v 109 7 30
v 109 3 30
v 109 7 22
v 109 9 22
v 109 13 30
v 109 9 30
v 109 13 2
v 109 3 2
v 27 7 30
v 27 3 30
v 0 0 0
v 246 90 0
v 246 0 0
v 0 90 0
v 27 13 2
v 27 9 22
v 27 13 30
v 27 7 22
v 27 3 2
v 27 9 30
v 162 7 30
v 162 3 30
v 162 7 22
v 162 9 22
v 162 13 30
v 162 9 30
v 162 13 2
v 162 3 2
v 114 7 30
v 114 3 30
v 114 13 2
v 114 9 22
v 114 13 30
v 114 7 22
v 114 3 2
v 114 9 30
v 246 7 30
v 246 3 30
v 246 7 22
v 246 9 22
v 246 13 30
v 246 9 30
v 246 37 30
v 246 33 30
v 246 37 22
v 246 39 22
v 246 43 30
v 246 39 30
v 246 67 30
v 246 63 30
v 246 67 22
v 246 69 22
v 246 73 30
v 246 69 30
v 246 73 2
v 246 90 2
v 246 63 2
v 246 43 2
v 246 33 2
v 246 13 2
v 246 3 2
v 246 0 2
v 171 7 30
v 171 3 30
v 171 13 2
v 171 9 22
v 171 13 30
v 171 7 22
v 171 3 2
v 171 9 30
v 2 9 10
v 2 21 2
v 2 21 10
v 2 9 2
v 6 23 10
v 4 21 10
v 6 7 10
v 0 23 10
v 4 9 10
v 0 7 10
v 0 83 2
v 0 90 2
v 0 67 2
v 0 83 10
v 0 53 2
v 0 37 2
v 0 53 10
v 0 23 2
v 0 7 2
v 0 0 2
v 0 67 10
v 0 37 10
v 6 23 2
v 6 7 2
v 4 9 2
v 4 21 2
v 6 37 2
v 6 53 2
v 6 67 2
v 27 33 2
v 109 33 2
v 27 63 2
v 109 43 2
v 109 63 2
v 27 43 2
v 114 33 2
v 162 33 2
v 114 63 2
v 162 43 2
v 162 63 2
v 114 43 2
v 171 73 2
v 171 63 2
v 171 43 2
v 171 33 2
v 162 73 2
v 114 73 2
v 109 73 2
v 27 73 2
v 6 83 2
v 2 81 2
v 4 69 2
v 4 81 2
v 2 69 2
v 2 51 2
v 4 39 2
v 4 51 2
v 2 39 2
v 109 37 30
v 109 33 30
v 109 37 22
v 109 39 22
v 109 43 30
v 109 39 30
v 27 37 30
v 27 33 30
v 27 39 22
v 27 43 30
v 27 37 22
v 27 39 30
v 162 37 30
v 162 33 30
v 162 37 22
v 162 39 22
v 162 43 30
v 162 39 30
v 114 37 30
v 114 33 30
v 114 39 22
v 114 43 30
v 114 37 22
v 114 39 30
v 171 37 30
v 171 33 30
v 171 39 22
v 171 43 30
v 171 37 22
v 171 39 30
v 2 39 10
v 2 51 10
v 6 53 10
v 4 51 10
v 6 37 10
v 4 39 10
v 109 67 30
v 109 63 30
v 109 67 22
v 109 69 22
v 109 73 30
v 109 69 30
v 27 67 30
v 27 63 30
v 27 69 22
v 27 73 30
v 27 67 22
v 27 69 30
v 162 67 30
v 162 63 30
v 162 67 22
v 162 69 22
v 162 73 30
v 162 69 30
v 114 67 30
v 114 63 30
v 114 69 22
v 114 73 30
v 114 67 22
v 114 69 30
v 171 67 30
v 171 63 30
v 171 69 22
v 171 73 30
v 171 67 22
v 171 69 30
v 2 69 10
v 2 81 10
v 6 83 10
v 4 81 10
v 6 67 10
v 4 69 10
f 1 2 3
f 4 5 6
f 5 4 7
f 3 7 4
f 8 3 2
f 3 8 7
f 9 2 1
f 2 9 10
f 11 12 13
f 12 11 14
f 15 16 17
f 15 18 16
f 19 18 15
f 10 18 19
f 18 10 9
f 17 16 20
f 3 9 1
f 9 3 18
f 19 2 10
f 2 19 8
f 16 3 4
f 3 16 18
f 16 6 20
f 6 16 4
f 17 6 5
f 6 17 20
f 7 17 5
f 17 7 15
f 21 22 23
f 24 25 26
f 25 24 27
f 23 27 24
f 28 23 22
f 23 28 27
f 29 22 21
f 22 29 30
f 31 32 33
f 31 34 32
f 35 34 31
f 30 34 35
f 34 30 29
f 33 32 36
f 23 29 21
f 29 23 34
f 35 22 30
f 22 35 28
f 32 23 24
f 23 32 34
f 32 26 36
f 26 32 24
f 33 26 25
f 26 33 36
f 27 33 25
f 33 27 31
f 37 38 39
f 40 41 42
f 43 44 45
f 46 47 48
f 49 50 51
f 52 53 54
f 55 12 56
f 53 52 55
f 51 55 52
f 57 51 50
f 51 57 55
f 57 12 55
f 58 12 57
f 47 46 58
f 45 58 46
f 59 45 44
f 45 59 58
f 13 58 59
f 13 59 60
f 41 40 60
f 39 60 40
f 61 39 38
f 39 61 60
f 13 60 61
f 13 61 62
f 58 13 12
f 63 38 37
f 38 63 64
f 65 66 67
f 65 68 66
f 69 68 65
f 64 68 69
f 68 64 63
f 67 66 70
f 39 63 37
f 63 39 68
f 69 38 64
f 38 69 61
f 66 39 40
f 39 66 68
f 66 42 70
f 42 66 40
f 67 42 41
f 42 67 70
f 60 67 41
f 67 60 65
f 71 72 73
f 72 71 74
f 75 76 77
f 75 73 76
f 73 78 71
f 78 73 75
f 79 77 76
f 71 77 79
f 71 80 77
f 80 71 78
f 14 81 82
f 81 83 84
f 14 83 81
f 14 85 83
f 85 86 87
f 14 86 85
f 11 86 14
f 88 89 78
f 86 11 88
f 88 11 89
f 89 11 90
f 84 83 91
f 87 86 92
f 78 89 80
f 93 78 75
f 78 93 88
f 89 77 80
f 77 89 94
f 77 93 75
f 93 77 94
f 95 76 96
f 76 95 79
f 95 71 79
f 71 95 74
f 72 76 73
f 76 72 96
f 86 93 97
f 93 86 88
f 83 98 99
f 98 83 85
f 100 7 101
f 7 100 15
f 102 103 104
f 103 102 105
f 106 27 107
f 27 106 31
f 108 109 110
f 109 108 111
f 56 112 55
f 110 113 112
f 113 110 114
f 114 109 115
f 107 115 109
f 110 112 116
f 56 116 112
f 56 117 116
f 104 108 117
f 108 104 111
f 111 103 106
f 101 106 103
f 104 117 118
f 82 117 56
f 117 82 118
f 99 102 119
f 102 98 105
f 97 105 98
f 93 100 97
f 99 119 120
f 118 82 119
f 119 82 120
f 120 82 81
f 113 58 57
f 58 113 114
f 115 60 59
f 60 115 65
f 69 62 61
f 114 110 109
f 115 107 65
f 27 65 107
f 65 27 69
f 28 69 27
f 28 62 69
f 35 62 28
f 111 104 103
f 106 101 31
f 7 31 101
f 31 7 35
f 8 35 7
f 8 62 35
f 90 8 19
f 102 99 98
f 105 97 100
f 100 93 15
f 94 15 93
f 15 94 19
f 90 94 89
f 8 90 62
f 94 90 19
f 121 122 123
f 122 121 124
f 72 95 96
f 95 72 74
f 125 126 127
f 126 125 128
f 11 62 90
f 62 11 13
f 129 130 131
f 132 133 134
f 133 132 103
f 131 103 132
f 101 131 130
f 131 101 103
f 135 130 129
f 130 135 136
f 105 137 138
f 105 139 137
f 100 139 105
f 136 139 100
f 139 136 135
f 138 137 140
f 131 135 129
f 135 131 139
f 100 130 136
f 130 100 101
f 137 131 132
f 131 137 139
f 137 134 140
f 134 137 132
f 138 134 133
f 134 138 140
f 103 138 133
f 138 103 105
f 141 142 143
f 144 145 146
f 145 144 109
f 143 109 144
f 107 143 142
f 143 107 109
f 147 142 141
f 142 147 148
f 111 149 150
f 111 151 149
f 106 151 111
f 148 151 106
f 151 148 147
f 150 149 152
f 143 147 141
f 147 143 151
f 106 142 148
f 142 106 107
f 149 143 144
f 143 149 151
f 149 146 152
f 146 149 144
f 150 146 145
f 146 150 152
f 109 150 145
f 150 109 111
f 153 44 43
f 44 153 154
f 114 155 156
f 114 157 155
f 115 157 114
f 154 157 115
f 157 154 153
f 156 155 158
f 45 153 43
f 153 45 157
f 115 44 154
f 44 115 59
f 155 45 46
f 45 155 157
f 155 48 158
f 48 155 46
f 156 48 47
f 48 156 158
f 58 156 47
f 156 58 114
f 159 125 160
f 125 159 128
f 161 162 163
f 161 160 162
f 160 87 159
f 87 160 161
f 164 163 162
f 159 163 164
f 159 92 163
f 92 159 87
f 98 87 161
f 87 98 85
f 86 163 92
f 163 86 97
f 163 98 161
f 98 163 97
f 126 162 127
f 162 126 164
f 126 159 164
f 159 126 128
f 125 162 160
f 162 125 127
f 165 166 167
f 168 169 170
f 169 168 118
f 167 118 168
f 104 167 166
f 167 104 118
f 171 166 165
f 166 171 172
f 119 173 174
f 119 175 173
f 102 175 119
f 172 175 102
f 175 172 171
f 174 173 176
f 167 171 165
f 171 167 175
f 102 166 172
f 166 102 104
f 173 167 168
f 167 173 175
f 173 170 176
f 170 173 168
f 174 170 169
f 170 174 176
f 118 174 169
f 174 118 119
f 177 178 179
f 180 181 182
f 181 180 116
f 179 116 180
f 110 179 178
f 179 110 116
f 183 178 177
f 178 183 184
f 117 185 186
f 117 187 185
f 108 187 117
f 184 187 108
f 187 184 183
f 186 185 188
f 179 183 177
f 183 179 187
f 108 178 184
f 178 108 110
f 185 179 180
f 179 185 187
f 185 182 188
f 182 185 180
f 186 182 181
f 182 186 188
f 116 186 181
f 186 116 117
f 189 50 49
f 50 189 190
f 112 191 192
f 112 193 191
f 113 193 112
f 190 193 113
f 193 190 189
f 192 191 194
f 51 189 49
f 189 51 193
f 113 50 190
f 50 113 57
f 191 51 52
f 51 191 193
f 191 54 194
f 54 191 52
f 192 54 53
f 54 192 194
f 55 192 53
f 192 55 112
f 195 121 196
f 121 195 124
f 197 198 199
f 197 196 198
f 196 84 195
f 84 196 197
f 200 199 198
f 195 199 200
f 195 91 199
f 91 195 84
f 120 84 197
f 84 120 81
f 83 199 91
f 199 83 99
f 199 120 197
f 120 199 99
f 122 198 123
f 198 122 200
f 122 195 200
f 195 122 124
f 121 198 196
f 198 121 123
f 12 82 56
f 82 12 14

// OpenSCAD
// file: ../cardshowcase.scad
module base_tarjeta(desplazamiento, posicion_tarjeta, longitud_tarjeta, altura_borde_tarjeta, altura_interior_tarjeta)
{
    color("purple") translate([ posicion_tarjeta, desplazamiento + 1, 0 ])
        cube([ longitud_tarjeta, 4, altura_borde_tarjeta + 2 ]);

    color("pink") translate([ posicion_tarjeta, desplazamiento + 5, 0 ])
        cube([ longitud_tarjeta, 2, altura_interior_tarjeta + 2 ]);

    color("purple") translate([ posicion_tarjeta, desplazamiento + 7, 0 ])
        cube([ longitud_tarjeta, 4, altura_borde_tarjeta + 2 ]);
}

module base_tarjeta_corta(desplazamiento, posicion_tarjeta, longitud_tarjeta, altura_borde_tarjeta,
                          altura_interior_tarjeta, tab_size)
{
    color("purple") translate([ posicion_tarjeta, desplazamiento + 1, 0 ])
        cube([ tab_size, 4, altura_borde_tarjeta + 2 ]);

    color("pink") translate([ posicion_tarjeta, desplazamiento + 5, 0 ])
        cube([ tab_size, 2, altura_interior_tarjeta + 2 ]);

    color("purple") translate([ posicion_tarjeta, desplazamiento + 7, 0 ])
        cube([ tab_size, 4, altura_borde_tarjeta + 2 ]);

    color("purple") translate([ longitud_tarjeta + posicion_tarjeta - tab_size, desplazamiento + 1, 0 ])
        cube([ tab_size, 4, altura_borde_tarjeta + 2 ]);

    color("pink") translate([ longitud_tarjeta + posicion_tarjeta - tab_size, desplazamiento + 5, 0 ])
        cube([ tab_size, 2, altura_interior_tarjeta + 2 ]);

    color("purple") translate([ longitud_tarjeta + posicion_tarjeta - tab_size, desplazamiento + 7, 0 ])
        cube([ tab_size, 4, altura_borde_tarjeta + 2 ]);
}

module soporte_tarjeta(tipo, size)
{
    if (tipo == "ISA8")
    {
        desplazamiento = 2;
        posicion_tarjeta = 27;
        longitud_tarjeta = 82;
        altura_borde_tarjeta = 28;
        altura_interior_tarjeta = 20;

        if (size == 0)
        {
            base_tarjeta(desplazamiento, posicion_tarjeta, longitud_tarjeta, altura_borde_tarjeta,
                         altura_interior_tarjeta);
        }
        else
        {
            base_tarjeta_corta(desplazamiento, posicion_tarjeta, longitud_tarjeta, altura_borde_tarjeta,
                               altura_interior_tarjeta, size);
        }
    }
    else if (tipo == "ISA16")
    {
        soporte_tarjeta("ISA8", size);

        desplazamiento = 2;
        posicion_tarjeta = 28 + 81 + 5;
        longitud_tarjeta = 48;
        altura_borde_tarjeta = 28;
        altura_interior_tarjeta = 20;

        if (size == 0)
        {
            base_tarjeta(desplazamiento, posicion_tarjeta, longitud_tarjeta, altura_borde_tarjeta,
                         altura_interior_tarjeta);
        }
        else
        {
            base_tarjeta_corta(desplazamiento, posicion_tarjeta, longitud_tarjeta, altura_borde_tarjeta,
                               altura_interior_tarjeta, size);
        }
    }
    else if (tipo == "VLB")
    {
        soporte_tarjeta("ISA16", size);

        desplazamiento = 2;
        posicion_tarjeta = 28 + 135 + 8;
        longitud_tarjeta = 75;
        altura_borde_tarjeta = 28;
        altura_interior_tarjeta = 20;

        if (size == 0)
        {
            base_tarjeta(desplazamiento, posicion_tarjeta, longitud_tarjeta, altura_borde_tarjeta,
                         altura_interior_tarjeta);
        }
        else
        {
            base_tarjeta_corta(desplazamiento, posicion_tarjeta, longitud_tarjeta, altura_borde_tarjeta,
                               altura_interior_tarjeta, size);
        }
    }
    else if (tipo == "PCI")
    {
        desplazamiento = 16;
        posicion_tarjeta = 43;
        longitud_tarjeta = 82;
        altura_borde_tarjeta = 28;
        altura_interior_tarjeta = 20;

        if (size == 0)
        {
            base_tarjeta(desplazamiento, posicion_tarjeta, longitud_tarjeta, altura_borde_tarjeta,
                         altura_interior_tarjeta);
        }
        else
        {
            base_tarjeta_corta(desplazamiento, posicion_tarjeta, longitud_tarjeta, altura_borde_tarjeta,
                               altura_interior_tarjeta, size);
        }
    }
    else if (tipo == "PCIe16")
    {
        desplazamiento = 16;
        posicion_tarjeta = 50;
        longitud_tarjeta = 85;
        altura_borde_tarjeta = 24;
        altura_interior_tarjeta = 16;

        if (size == 0)
        {
            base_tarjeta(desplazamiento, posicion_tarjeta, longitud_tarjeta, altura_borde_tarjeta,
                         altura_interior_tarjeta);
        }
        else
        {
            base_tarjeta_corta(desplazamiento, posicion_tarjeta, longitud_tarjeta, altura_borde_tarjeta,
                               altura_interior_tarjeta, size);
        }
    }
    else if (tipo == "PCIe8")
    {
        desplazamiento = 16;
        posicion_tarjeta = 50;
        longitud_tarjeta = 52;
        altura_borde_tarjeta = 24;
        altura_interior_tarjeta = 16;

        if (size == 0)
        {
            base_tarjeta(desplazamiento, posicion_tarjeta, longitud_tarjeta, altura_borde_tarjeta,
                         altura_interior_tarjeta);
        }
        else
        {
            base_tarjeta_corta(desplazamiento, posicion_tarjeta, longitud_tarjeta, altura_borde_tarjeta,
                               altura_interior_tarjeta, size);
        }
    }
    else if (tipo == "PCIe4")
    {
        desplazamiento = 16;
        posicion_tarjeta = 50;
        longitud_tarjeta = 35;
        altura_borde_tarjeta = 24;
        altura_interior_tarjeta = 16;

        if (size == 0)
        {
            base_tarjeta(desplazamiento, posicion_tarjeta, longitud_tarjeta, altura_borde_tarjeta,
                         altura_interior_tarjeta);
        }
        else
        {
            base_tarjeta_corta(desplazamiento, posicion_tarjeta, longitud_tarjeta, altura_borde_tarjeta,
                               altura_interior_tarjeta, size);
        }
    }
    else if (tipo == "PCIe1")
    {
        desplazamiento = 16;
        posicion_tarjeta = 50;
        longitud_tarjeta = 21;
        altura_borde_tarjeta = 24;
        altura_interior_tarjeta = 16;

        if (size == 0)
        {
            base_tarjeta(desplazamiento, posicion_tarjeta, longitud_tarjeta, altura_borde_tarjeta,
                         altura_interior_tarjeta);
        }
        else
        {
            base_tarjeta_corta(desplazamiento, posicion_tarjeta, longitud_tarjeta, altura_borde_tarjeta,
                               altura_interior_tarjeta, size);
        }
    }
    else if (tipo == "AGP")
    {
        desplazamiento = 16;
        posicion_tarjeta = 70;
        longitud_tarjeta = 68;
        altura_borde_tarjeta = 28;
        altura_interior_tarjeta = 20;

        if (size == 0)
        {
            base_tarjeta(desplazamiento, posicion_tarjeta, longitud_tarjeta, altura_borde_tarjeta,
                         altura_interior_tarjeta);
        }
        else
        {
            base_tarjeta_corta(desplazamiento, posicion_tarjeta, longitud_tarjeta, altura_borde_tarjeta,
                               altura_interior_tarjeta, size);
        }
    }
    else if (tipo == "EISA")
    {
        desplazamiento = 2;
        posicion_tarjeta = 27;
        longitud_tarjeta = 52 + 83;
        altura_borde_tarjeta = 28;
        altura_interior_tarjeta = 15;

        if (size == 0)
        {
            base_tarjeta(desplazamiento, posicion_tarjeta, longitud_tarjeta, altura_borde_tarjeta,
                         altura_interior_tarjeta);
        }
        else
        {
            base_tarjeta_corta(desplazamiento, posicion_tarjeta, longitud_tarjeta, altura_borde_tarjeta,
                               altura_interior_tarjeta, size);
        }
    }
}

module base_placa(tipo)
{
    if (tipo == "ISA8")
    {
        color("cyan") cube([ 109, 30, 2 ]);
    }
    else if (tipo == "ISA16")
    {
        color("cyan") cube([ 162, 30, 2 ]);
    }
    else if (tipo == "VLB")
    {
        color("cyan") cube([ 246, 30, 2 ]);
    }
    else if (tipo == "PCI")
    {
        color("cyan") cube([ 125, 30, 2 ]);
    }
    else if (tipo == "PCIe16")
    {
        color("cyan") cube([ 135, 30, 2 ]);
    }
    else if (tipo == "PCIe8")
    {
        color("cyan") cube([ 102, 30, 2 ]);
    }
    else if (tipo == "PCIe4")
    {
        color("cyan") cube([ 85, 30, 2 ]);
    }
    else if (tipo == "PCIe1")
    {
        color("cyan") cube([ 71, 30, 2 ]);
    }
    else if (tipo == "AGP")
    {
        color("cyan") cube([ 138, 30, 2 ]);
    }
    else if (tipo == "EISA")
    {
        color("cyan") cube([ 162, 30, 2 ]);
    }
    else if (is_num(tipo))
    {
        color("cyan") cube([ tipo, 30, 2]);
    }
}

override_base = undef;

module base(tipo)
{
    if (override_base == undef)
    {
        base_placa(tipo);
    }
    else
    {
        base_placa(override_base);
    }
}

module single_slot(tipo, position, size = 0)
{
    displacement = position * 30;

    color("red") translate([ 0, 7 + displacement, 0 ]) cube([ 2, 16, 10 ]);

    color("red") translate([ 4, 7 + displacement, 0 ]) cube([ 2, 16, 10 ]);

    color("red") translate([ 2, 7 + displacement, 0 ]) cube([ 2, 2, 10 ]);

    color("red") translate([ 2, 21 + displacement, 0 ]) cube([ 2, 2, 10 ]);

    translate([ 0, displacement, 0 ]) soporte_tarjeta(tipo, size);
    translate([ 0, displacement, 0 ]) base(tipo);
}
// main file
include <../cardshowcase.scad>

for ( i = [0 : 2] ){
    single_slot("VLB", i);
}
